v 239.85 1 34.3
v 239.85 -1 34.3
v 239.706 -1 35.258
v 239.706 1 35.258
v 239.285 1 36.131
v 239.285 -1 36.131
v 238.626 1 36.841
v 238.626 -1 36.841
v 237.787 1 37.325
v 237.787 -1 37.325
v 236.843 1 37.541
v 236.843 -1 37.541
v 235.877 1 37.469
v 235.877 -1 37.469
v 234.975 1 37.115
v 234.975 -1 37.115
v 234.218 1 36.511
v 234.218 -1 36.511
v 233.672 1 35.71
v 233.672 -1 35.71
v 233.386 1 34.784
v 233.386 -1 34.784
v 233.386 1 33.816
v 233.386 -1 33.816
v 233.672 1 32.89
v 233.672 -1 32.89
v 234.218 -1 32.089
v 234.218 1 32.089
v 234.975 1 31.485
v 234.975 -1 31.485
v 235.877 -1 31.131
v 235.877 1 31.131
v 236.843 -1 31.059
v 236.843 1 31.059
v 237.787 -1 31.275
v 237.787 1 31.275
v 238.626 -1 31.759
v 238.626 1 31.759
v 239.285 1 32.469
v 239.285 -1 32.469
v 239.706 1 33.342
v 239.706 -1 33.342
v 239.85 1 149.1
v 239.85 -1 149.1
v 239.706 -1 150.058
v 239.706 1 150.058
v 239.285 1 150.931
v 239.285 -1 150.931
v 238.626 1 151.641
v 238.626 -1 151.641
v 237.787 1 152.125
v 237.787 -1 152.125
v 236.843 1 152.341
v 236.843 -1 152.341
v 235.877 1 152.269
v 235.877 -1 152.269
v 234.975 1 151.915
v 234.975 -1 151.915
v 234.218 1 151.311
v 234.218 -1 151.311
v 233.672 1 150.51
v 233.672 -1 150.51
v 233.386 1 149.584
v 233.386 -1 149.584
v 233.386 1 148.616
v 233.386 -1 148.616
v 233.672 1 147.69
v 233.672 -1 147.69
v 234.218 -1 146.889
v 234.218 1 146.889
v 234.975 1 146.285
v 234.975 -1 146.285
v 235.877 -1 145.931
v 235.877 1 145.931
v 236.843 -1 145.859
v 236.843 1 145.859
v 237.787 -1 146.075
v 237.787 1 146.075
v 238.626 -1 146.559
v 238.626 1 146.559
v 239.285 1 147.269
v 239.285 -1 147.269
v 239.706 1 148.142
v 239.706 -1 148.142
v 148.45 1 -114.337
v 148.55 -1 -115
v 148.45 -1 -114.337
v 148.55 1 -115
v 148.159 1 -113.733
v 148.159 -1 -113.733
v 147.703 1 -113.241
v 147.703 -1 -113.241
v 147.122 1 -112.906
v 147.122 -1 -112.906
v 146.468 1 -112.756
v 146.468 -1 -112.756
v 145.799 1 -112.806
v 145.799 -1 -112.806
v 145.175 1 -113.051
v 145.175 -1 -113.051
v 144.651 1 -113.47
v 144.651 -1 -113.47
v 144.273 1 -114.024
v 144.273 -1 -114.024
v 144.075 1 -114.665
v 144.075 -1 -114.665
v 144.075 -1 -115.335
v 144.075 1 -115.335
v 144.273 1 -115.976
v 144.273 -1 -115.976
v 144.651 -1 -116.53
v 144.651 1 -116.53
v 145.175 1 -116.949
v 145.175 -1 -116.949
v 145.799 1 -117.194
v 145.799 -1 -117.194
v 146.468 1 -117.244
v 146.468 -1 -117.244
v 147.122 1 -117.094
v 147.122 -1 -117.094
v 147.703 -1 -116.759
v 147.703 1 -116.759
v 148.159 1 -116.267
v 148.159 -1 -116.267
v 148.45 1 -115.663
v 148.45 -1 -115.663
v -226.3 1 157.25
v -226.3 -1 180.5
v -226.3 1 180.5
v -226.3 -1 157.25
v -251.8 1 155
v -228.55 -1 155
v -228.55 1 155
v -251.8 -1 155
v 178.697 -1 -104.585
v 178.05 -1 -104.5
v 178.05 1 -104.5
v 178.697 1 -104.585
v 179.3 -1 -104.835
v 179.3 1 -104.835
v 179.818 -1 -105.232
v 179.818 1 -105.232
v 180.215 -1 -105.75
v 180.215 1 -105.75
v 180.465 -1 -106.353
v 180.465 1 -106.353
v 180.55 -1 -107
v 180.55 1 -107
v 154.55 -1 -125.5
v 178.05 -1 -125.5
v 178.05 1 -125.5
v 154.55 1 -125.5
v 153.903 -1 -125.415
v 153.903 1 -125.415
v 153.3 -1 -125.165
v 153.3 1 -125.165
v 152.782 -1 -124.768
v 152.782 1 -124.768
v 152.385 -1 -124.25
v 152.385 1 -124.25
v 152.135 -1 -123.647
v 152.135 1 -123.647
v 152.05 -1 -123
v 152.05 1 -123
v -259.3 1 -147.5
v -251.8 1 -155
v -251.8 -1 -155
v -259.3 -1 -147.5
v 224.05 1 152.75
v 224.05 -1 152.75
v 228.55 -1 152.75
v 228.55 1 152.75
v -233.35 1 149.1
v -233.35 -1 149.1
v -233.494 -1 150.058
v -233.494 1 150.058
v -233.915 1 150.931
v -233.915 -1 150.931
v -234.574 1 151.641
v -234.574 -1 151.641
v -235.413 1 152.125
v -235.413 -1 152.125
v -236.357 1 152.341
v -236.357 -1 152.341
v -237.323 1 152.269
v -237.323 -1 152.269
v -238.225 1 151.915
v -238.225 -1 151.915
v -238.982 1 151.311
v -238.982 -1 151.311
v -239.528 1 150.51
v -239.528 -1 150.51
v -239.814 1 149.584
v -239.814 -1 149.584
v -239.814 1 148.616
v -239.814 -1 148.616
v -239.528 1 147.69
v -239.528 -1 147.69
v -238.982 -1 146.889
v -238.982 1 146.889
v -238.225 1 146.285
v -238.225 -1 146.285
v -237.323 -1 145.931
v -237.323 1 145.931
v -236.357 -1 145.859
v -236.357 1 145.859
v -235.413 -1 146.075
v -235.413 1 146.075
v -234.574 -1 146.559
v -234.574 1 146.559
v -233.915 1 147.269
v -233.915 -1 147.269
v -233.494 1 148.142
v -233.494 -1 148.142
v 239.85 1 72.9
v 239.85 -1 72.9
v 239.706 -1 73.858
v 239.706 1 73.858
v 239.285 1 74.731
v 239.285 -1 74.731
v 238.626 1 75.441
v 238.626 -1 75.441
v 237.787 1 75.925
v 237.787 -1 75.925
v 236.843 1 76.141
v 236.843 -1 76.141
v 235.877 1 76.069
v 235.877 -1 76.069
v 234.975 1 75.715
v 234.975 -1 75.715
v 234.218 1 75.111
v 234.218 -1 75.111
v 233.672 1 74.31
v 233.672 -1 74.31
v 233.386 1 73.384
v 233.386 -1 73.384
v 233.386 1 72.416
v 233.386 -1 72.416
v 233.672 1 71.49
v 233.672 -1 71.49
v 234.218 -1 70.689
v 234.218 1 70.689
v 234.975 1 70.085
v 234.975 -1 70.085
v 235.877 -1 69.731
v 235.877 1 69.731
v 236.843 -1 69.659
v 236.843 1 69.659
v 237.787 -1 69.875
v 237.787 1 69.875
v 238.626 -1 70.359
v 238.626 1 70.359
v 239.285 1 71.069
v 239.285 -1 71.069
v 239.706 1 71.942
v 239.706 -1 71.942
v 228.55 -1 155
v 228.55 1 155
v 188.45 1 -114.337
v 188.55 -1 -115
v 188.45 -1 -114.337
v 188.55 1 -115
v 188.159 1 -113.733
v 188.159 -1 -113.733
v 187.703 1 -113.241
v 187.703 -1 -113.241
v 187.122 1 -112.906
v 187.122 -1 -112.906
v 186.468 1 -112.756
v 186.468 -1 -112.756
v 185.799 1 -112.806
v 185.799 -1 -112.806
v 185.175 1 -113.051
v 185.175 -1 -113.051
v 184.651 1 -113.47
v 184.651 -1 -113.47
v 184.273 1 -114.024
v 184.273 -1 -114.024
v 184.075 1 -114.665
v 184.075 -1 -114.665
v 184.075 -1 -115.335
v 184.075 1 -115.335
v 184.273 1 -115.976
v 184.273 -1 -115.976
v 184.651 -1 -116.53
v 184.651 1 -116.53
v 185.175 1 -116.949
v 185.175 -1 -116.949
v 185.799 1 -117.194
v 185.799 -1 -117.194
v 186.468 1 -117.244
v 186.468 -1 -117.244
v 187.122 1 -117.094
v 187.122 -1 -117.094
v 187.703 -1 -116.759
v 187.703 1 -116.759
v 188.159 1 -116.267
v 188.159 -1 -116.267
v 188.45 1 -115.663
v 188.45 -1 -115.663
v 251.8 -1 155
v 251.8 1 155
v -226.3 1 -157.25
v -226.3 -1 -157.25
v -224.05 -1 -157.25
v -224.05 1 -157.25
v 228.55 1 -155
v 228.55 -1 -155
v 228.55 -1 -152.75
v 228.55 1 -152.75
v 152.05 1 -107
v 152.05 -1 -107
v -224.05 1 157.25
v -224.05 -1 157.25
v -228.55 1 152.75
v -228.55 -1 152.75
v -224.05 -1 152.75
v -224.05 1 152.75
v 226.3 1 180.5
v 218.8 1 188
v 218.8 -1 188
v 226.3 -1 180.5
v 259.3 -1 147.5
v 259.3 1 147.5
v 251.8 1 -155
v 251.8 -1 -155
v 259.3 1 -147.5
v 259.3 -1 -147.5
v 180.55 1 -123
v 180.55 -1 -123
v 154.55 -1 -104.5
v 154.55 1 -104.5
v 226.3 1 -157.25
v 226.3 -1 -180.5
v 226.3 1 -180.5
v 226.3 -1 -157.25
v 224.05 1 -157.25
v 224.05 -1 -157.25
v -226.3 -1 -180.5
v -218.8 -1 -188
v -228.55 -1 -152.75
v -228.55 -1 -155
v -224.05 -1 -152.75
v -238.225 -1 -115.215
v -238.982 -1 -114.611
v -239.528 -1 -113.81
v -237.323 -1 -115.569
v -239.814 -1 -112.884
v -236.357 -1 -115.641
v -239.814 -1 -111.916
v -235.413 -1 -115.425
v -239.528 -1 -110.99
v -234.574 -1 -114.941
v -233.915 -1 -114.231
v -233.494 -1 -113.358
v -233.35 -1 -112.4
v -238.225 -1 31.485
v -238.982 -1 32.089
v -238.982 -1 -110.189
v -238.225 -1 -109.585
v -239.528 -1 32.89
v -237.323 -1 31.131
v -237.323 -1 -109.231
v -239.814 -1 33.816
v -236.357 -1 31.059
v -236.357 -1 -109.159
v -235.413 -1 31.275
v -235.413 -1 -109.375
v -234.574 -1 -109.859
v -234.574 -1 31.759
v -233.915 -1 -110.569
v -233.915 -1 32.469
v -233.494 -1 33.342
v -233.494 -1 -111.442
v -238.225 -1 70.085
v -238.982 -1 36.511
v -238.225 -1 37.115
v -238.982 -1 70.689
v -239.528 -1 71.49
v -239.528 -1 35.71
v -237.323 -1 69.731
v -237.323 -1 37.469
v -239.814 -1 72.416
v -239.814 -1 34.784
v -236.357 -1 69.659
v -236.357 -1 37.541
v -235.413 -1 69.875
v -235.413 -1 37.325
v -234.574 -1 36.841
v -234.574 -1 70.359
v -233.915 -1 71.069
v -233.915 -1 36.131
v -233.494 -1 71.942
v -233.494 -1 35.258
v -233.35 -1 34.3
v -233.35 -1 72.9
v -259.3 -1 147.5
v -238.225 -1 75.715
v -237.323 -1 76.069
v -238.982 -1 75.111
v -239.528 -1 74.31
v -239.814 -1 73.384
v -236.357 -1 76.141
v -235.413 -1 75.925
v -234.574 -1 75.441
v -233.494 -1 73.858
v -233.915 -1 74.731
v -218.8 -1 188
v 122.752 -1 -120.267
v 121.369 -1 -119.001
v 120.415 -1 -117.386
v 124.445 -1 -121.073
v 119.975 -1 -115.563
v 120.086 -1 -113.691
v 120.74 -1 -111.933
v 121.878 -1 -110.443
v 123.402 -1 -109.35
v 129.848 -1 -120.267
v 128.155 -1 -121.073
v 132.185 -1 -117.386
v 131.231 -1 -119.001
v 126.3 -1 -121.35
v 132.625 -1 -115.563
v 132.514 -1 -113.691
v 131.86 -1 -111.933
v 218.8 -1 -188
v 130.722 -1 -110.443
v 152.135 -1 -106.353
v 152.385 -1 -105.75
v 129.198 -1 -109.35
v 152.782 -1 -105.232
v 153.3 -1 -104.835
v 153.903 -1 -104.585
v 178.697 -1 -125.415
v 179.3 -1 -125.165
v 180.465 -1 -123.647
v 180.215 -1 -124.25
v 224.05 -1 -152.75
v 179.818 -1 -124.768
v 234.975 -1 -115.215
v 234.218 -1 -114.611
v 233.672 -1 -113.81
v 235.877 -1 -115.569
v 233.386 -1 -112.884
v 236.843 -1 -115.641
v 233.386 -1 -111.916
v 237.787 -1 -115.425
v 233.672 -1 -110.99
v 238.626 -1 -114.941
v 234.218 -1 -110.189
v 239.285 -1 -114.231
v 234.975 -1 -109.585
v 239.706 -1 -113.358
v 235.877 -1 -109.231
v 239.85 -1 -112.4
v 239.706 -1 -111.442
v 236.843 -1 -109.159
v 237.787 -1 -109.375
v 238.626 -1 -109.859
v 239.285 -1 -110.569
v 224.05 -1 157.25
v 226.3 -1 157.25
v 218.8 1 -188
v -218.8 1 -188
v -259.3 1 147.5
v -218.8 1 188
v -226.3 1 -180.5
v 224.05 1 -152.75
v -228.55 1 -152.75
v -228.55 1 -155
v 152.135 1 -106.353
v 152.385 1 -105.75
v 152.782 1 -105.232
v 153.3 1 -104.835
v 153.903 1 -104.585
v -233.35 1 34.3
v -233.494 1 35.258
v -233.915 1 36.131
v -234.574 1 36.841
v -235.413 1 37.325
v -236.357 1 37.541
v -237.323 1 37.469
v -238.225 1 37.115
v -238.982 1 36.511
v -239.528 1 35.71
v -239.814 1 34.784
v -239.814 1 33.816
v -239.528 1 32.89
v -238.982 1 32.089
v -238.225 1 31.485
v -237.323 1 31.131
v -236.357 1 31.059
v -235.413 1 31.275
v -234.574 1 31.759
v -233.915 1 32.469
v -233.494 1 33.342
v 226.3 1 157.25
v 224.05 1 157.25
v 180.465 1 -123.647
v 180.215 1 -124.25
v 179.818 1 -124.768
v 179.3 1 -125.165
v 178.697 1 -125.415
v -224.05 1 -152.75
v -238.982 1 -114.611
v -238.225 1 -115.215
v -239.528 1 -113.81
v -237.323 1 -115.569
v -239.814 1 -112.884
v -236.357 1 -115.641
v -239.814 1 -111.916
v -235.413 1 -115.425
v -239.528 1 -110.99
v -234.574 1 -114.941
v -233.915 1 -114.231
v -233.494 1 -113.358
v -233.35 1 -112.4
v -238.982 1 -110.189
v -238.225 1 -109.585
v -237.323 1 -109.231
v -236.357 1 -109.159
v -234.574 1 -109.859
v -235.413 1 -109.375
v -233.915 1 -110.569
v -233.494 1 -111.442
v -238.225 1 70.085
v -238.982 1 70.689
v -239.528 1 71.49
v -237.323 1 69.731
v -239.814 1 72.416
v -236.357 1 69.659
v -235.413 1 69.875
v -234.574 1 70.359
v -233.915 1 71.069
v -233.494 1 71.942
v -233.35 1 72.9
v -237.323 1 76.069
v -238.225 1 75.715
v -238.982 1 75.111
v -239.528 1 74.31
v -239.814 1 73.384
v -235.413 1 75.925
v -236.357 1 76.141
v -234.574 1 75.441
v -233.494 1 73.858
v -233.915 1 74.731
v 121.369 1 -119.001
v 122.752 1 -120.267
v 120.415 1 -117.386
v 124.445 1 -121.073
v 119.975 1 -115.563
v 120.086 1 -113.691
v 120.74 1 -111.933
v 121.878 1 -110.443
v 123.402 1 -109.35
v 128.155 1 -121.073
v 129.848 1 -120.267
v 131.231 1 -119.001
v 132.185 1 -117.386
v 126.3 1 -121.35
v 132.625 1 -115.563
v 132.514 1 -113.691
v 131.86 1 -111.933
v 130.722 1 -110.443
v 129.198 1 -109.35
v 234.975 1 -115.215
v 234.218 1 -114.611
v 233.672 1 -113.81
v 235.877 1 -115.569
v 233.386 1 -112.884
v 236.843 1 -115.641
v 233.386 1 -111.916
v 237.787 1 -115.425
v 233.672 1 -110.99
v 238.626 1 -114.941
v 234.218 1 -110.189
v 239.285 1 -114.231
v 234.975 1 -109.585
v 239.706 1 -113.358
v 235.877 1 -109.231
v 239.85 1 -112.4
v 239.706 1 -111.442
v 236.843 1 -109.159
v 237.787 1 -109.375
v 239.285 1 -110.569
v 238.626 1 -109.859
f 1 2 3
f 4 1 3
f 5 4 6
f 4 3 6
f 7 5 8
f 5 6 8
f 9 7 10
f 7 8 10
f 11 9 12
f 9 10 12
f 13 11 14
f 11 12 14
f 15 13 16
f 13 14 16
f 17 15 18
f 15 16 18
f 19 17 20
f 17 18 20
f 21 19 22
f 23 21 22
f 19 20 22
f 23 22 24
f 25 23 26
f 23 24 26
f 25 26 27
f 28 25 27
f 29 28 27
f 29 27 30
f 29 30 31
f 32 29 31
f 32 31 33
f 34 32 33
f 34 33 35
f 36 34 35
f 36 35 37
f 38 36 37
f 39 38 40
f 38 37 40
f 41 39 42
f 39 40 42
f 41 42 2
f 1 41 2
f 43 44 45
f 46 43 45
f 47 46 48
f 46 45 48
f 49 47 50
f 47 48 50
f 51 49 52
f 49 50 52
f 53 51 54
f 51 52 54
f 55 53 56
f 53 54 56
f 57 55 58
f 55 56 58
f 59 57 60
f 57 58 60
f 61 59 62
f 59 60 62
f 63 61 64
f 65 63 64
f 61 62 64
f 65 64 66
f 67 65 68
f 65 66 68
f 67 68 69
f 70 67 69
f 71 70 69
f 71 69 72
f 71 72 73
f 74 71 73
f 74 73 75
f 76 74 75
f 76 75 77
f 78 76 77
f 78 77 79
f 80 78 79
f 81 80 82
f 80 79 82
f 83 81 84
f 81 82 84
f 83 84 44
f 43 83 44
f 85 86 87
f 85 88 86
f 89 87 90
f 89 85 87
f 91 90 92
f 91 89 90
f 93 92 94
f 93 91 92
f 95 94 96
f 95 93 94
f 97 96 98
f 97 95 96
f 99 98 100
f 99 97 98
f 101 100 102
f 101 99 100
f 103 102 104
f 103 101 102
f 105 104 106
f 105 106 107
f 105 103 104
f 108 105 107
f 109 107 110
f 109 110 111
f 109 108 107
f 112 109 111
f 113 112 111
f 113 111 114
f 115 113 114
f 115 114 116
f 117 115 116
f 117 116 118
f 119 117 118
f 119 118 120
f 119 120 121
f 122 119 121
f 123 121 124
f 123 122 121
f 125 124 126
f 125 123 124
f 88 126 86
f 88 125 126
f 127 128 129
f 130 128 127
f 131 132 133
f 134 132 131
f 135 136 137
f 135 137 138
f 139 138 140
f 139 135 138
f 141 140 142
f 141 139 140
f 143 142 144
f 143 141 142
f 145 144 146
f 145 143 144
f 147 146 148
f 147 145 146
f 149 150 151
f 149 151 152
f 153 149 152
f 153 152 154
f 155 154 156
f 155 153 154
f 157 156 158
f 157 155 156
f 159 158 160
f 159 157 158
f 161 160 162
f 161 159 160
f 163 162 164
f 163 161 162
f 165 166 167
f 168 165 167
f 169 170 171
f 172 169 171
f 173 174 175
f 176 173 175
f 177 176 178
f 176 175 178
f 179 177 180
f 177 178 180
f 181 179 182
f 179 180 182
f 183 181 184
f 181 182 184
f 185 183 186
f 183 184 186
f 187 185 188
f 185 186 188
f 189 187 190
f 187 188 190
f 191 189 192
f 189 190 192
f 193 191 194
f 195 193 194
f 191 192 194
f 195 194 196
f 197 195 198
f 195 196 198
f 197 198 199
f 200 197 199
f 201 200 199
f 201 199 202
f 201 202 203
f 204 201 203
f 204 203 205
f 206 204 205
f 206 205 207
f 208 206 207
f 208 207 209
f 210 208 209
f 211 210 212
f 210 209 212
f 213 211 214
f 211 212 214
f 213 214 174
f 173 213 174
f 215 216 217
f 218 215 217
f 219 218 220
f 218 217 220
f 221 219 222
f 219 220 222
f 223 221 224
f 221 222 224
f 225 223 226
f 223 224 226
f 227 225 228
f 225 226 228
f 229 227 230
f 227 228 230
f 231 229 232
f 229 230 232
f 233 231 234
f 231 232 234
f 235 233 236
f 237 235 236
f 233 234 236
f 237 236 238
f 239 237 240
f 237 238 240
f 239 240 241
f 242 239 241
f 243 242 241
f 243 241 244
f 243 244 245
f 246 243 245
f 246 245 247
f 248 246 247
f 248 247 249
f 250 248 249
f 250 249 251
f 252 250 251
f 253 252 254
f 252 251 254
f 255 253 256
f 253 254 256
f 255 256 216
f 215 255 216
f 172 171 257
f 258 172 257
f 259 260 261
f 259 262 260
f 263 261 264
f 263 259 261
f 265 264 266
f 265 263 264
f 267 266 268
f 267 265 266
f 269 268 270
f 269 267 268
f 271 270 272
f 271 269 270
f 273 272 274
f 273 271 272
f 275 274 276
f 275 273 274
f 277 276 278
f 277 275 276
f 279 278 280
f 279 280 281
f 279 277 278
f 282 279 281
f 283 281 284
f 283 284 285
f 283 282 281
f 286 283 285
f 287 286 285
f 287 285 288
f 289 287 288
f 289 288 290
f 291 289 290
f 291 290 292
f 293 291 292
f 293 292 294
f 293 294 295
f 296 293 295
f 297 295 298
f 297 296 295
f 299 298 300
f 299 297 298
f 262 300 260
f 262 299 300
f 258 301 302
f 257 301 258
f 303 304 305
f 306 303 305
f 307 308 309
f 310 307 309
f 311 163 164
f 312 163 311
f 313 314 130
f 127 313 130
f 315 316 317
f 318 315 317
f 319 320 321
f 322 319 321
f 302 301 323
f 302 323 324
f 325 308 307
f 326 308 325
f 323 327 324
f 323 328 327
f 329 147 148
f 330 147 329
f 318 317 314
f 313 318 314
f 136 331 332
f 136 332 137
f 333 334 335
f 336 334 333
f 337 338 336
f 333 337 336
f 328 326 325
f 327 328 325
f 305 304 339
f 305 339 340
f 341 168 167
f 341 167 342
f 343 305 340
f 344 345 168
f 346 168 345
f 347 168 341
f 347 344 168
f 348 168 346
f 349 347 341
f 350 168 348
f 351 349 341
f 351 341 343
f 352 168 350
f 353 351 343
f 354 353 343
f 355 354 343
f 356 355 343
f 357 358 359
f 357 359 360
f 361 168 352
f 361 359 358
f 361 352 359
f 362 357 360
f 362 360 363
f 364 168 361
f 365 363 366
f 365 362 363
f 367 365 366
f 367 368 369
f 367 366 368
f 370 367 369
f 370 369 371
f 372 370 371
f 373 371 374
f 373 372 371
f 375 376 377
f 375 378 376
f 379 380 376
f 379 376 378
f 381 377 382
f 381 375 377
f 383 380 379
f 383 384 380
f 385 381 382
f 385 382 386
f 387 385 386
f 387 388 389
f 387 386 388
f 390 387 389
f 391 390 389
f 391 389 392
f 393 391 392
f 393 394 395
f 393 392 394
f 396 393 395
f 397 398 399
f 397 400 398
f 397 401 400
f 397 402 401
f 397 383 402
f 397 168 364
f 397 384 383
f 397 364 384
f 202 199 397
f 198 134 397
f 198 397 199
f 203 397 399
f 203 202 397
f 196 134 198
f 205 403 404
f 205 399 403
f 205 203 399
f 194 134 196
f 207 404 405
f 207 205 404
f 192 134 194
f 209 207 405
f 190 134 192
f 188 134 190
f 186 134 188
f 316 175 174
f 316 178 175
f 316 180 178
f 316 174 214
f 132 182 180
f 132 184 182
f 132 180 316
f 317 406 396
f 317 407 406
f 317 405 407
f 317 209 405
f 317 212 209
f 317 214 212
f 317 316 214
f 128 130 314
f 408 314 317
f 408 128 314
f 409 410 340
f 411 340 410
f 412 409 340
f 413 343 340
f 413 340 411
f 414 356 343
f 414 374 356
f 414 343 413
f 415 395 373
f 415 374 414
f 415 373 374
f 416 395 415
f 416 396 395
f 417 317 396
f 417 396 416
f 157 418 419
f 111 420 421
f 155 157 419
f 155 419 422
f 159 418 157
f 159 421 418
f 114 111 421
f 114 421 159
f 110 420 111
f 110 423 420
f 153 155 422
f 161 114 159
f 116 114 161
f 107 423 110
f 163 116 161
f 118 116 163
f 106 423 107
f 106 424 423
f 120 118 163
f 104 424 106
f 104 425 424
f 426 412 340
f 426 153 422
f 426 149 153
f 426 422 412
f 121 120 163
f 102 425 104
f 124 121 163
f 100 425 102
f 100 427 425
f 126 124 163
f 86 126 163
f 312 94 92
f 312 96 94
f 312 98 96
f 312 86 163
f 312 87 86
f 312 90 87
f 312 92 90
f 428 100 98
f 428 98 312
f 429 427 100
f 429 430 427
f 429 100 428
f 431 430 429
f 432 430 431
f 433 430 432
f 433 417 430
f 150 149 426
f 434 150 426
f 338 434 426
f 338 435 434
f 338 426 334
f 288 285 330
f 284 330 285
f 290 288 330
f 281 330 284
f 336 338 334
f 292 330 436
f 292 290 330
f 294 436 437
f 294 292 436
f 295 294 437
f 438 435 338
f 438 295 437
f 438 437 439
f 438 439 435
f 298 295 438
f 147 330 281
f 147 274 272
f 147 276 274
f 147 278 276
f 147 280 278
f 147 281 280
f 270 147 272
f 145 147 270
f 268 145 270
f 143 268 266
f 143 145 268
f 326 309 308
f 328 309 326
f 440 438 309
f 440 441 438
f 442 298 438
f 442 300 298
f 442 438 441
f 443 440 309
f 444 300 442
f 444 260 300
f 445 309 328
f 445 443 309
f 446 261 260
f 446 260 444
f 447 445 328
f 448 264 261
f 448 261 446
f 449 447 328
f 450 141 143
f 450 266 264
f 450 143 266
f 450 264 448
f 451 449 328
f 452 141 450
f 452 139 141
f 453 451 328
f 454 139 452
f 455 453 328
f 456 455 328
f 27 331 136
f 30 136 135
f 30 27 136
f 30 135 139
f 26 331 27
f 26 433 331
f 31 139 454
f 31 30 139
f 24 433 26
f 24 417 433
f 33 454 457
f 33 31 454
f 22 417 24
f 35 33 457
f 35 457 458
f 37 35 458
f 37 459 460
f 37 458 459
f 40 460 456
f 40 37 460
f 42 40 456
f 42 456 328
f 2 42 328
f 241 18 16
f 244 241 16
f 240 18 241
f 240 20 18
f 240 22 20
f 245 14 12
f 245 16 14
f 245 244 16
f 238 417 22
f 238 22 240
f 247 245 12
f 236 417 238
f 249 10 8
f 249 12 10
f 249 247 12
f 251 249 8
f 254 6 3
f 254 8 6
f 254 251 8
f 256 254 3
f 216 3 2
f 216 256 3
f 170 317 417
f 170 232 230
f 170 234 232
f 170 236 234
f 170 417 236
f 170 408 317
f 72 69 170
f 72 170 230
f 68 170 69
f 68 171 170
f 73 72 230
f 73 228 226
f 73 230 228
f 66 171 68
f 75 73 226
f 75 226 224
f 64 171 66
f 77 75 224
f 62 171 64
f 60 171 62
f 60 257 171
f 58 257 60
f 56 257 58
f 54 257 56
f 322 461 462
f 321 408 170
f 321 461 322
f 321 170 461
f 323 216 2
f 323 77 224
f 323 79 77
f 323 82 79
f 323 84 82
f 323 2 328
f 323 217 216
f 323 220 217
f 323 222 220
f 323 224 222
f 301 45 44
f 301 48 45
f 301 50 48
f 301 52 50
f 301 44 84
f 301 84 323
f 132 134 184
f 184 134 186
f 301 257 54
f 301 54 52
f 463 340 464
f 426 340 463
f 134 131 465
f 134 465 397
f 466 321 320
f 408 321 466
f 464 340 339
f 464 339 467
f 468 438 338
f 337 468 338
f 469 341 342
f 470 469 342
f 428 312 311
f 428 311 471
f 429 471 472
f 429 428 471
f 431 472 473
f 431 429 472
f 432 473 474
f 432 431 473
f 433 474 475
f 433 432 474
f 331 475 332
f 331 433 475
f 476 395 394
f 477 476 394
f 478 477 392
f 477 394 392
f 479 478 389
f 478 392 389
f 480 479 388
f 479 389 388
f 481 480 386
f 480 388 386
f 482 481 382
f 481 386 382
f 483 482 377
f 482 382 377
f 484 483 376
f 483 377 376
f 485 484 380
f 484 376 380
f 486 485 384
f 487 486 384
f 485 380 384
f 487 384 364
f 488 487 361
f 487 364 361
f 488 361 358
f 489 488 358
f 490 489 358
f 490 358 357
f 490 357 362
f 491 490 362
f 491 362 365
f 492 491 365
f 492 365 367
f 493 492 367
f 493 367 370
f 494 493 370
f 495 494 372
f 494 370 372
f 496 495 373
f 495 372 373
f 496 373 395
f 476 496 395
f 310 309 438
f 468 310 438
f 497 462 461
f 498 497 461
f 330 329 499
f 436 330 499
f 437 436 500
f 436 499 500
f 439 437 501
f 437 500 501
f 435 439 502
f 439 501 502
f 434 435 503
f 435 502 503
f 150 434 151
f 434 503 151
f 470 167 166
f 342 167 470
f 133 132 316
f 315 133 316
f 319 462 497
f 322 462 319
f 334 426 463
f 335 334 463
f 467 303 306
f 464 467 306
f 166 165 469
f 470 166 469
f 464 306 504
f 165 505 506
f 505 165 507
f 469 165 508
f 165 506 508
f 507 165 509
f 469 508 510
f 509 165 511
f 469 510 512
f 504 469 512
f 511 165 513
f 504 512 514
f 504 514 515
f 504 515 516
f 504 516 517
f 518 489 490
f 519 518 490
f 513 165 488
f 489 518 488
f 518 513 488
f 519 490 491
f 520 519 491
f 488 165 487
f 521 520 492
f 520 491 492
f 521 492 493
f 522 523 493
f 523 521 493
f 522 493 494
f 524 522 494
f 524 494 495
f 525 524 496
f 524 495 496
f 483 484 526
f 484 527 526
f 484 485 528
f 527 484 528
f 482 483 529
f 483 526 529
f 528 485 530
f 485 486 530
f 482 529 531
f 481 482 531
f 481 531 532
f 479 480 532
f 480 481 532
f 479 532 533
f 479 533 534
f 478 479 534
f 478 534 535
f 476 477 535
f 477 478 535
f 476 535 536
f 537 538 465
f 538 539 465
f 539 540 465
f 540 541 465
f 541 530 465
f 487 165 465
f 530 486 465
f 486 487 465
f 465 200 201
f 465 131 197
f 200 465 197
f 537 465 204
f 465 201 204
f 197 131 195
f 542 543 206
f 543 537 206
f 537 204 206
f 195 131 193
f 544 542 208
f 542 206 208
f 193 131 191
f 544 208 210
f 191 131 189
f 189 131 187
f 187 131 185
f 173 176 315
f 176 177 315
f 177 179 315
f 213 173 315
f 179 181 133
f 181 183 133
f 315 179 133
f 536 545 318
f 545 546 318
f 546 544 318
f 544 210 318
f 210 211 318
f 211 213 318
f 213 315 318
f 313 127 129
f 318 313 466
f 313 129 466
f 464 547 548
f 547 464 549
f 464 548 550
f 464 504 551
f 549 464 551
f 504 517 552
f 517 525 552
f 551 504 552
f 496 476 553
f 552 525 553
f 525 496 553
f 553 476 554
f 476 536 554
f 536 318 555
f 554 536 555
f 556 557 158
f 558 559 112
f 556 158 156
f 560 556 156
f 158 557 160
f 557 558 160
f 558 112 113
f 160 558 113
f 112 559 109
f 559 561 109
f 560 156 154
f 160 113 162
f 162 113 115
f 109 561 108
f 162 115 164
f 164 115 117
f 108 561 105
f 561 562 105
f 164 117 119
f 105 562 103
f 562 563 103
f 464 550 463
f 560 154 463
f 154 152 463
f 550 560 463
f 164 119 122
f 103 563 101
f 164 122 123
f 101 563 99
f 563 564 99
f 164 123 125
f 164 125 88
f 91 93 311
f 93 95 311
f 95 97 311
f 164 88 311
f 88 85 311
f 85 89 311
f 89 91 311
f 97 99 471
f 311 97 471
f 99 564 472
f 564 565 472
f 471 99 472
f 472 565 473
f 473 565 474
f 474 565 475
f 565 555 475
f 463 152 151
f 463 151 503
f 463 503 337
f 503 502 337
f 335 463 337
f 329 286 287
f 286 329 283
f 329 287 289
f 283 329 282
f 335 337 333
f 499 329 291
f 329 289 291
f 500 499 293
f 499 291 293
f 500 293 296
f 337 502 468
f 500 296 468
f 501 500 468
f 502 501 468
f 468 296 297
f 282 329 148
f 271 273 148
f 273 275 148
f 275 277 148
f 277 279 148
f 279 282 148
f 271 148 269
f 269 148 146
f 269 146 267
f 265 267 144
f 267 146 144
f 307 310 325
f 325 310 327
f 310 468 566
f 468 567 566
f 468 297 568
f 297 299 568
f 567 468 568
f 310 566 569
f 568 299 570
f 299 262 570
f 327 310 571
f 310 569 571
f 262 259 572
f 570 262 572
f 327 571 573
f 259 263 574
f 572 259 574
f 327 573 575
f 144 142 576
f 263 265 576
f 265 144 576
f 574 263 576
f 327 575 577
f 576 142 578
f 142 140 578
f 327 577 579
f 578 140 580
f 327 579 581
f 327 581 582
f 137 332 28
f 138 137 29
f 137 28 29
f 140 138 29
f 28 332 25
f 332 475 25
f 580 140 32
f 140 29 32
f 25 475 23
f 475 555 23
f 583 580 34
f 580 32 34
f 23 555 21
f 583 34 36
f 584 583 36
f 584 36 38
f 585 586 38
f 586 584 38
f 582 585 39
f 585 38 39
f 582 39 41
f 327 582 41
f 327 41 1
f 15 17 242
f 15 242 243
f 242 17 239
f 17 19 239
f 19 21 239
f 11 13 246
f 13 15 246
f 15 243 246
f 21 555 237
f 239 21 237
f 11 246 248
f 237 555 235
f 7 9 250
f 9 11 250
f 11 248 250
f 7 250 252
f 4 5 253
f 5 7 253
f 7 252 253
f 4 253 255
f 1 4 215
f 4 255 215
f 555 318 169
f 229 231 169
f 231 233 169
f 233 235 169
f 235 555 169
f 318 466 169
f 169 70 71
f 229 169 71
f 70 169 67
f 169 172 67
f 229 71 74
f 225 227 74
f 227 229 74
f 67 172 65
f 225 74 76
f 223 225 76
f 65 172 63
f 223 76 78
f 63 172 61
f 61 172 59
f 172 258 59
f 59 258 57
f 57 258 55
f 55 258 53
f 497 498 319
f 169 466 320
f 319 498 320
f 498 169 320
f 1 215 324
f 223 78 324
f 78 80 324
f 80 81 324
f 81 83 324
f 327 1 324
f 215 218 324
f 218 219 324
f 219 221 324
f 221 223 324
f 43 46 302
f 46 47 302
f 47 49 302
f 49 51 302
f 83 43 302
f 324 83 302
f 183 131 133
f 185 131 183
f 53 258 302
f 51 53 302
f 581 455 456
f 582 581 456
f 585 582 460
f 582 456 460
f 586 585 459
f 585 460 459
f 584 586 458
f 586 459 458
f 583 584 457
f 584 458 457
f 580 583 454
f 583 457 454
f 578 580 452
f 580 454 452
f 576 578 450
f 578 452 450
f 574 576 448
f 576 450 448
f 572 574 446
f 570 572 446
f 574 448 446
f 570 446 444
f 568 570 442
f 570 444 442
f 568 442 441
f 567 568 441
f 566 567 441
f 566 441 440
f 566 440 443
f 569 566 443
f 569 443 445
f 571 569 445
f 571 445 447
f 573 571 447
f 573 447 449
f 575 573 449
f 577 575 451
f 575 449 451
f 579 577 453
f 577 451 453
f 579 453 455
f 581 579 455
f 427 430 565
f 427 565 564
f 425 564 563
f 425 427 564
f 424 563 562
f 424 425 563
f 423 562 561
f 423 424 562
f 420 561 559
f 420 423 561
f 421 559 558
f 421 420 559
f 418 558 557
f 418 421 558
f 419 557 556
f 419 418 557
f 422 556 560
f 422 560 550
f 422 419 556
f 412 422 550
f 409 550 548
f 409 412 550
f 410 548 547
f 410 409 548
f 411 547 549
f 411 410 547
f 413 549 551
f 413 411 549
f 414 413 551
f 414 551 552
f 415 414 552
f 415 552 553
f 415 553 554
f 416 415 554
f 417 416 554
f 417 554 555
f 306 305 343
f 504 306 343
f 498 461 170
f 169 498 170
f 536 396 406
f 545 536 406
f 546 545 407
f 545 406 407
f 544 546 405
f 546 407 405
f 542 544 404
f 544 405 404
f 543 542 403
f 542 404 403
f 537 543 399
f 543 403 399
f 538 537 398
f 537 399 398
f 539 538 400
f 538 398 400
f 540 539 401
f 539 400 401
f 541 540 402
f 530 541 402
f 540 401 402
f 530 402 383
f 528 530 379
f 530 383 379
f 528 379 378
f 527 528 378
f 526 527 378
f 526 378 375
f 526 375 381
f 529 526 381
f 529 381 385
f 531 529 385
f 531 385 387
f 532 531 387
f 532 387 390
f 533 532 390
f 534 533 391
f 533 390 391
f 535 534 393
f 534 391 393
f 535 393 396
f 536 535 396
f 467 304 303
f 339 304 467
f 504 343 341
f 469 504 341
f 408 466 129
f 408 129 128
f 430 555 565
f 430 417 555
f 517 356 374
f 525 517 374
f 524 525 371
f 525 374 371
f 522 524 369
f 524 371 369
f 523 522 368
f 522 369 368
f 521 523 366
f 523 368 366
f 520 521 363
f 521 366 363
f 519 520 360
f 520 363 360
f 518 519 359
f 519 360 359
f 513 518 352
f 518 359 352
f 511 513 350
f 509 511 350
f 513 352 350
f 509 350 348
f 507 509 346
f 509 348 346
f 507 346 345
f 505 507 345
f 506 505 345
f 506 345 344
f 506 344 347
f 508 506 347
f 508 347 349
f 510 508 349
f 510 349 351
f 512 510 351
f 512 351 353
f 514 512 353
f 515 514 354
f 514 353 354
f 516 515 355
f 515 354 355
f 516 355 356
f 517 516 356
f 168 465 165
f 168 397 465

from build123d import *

# Parameters (mm, degrees)
F0_R     = 2.25
F1_DEPTH = 1
F2_SIZE  = 7.5
F3_R     = 3.25
F4_DEPTH = 2


# Not quite as in the source:
# - a feature names something its author has since deleted; it is built from what else it names


with BuildPart() as f1:
    # F0 (on Front) → F1 (new body, symmetric)
    with BuildSketch(Plane.XZ):
        Polygon((226.3, 155), (226.3, 188), (-226.3, 188), (-226.3, 155), (-259.3, 155), (-259.3, -155), (-226.3, -155), (-226.3, -188), (226.3, -188), (226.3, -155), (259.3, -155), (259.3, 155), align=None)
        with BuildLine():
            ThreePointArc((129.1982753492, -109.35), (126.3, -121.35), (123.4017246508, -109.35))
            Line((123.4017246508, -109.35), (129.1982753492, -109.35))
        make_face(mode=Mode.SUBTRACT)
        with Locations((146.3, -115)):
            Circle(F0_R, mode=Mode.SUBTRACT)
        with BuildLine():
            Line((154.55, -104.5), (178.05, -104.5))
            ThreePointArc((178.05, -104.5), (179.817766953, -105.232233047), (180.55, -107))
            Line((180.55, -107), (180.55, -123))
            ThreePointArc((180.55, -123), (179.817766953, -124.767766953), (178.05, -125.5))
            Line((178.05, -125.5), (154.55, -125.5))
            ThreePointArc((154.55, -125.5), (152.782233047, -124.767766953), (152.05, -123))
            Line((152.05, -123), (152.05, -107))
            ThreePointArc((152.05, -107), (152.782233047, -105.232233047), (154.55, -104.5))
        make_face(mode=Mode.SUBTRACT)
        with Locations((186.3, -115)):
            Circle(F0_R, mode=Mode.SUBTRACT)
    extrude(amount=F1_DEPTH, both=True)

    # F2
    f2_edges = [f1.edges().sort_by_distance(p)[0] for p in [
        (226.3, 0, 188),
        (259.3, 0, 155),
        (259.3, 0, -155),
        (226.3, 0, -188),
        (-226.3, 0, 188),
        (-259.3, 0, 155),
        (-259.3, 0, -155),
        (-226.3, 0, -188),
    ]]
    chamfer(f2_edges, length=F2_SIZE)

    # F3 (on face) → F4 (cut, through all)
    with BuildSketch(Plane.XZ.offset(1)):
        Polygon((-228.55, -152.75), (-228.55, -155), (-226.3, -155), (-226.3, -157.25), (-224.05, -157.25), (-224.05, -152.75), align=None)
        Polygon((226.3, -155), (228.55, -155), (228.55, -152.75), (224.05, -152.75), (224.05, -157.25), (226.3, -157.25), align=None)
        with Locations((-236.6, 149.1)):
            Circle(F3_R)
        with Locations((-236.6, 72.9)):
            Circle(F3_R)
        with Locations((-236.6, 34.3)):
            Circle(F3_R)
        with Locations((-236.6, -112.4)):
            Circle(F3_R)
        with Locations((236.6, -112.4)):
            Circle(F3_R)
        with Locations((236.6, 34.3)):
            Circle(F3_R)
        with Locations((236.6, 72.9)):
            Circle(F3_R)
        with Locations((236.6, 149.1)):
            Circle(F3_R)
        Polygon((226.3, 155), (226.3, 157.25), (224.05, 157.25), (224.05, 152.75), (228.55, 152.75), (228.55, 155), align=None)
        Polygon((-224.05, 152.75), (-224.05, 157.25), (-226.3, 157.25), (-226.3, 155), (-228.55, 155), (-228.55, 152.75), align=None)
    extrude(amount=-F4_DEPTH, mode=Mode.SUBTRACT)


solid = f1.part
